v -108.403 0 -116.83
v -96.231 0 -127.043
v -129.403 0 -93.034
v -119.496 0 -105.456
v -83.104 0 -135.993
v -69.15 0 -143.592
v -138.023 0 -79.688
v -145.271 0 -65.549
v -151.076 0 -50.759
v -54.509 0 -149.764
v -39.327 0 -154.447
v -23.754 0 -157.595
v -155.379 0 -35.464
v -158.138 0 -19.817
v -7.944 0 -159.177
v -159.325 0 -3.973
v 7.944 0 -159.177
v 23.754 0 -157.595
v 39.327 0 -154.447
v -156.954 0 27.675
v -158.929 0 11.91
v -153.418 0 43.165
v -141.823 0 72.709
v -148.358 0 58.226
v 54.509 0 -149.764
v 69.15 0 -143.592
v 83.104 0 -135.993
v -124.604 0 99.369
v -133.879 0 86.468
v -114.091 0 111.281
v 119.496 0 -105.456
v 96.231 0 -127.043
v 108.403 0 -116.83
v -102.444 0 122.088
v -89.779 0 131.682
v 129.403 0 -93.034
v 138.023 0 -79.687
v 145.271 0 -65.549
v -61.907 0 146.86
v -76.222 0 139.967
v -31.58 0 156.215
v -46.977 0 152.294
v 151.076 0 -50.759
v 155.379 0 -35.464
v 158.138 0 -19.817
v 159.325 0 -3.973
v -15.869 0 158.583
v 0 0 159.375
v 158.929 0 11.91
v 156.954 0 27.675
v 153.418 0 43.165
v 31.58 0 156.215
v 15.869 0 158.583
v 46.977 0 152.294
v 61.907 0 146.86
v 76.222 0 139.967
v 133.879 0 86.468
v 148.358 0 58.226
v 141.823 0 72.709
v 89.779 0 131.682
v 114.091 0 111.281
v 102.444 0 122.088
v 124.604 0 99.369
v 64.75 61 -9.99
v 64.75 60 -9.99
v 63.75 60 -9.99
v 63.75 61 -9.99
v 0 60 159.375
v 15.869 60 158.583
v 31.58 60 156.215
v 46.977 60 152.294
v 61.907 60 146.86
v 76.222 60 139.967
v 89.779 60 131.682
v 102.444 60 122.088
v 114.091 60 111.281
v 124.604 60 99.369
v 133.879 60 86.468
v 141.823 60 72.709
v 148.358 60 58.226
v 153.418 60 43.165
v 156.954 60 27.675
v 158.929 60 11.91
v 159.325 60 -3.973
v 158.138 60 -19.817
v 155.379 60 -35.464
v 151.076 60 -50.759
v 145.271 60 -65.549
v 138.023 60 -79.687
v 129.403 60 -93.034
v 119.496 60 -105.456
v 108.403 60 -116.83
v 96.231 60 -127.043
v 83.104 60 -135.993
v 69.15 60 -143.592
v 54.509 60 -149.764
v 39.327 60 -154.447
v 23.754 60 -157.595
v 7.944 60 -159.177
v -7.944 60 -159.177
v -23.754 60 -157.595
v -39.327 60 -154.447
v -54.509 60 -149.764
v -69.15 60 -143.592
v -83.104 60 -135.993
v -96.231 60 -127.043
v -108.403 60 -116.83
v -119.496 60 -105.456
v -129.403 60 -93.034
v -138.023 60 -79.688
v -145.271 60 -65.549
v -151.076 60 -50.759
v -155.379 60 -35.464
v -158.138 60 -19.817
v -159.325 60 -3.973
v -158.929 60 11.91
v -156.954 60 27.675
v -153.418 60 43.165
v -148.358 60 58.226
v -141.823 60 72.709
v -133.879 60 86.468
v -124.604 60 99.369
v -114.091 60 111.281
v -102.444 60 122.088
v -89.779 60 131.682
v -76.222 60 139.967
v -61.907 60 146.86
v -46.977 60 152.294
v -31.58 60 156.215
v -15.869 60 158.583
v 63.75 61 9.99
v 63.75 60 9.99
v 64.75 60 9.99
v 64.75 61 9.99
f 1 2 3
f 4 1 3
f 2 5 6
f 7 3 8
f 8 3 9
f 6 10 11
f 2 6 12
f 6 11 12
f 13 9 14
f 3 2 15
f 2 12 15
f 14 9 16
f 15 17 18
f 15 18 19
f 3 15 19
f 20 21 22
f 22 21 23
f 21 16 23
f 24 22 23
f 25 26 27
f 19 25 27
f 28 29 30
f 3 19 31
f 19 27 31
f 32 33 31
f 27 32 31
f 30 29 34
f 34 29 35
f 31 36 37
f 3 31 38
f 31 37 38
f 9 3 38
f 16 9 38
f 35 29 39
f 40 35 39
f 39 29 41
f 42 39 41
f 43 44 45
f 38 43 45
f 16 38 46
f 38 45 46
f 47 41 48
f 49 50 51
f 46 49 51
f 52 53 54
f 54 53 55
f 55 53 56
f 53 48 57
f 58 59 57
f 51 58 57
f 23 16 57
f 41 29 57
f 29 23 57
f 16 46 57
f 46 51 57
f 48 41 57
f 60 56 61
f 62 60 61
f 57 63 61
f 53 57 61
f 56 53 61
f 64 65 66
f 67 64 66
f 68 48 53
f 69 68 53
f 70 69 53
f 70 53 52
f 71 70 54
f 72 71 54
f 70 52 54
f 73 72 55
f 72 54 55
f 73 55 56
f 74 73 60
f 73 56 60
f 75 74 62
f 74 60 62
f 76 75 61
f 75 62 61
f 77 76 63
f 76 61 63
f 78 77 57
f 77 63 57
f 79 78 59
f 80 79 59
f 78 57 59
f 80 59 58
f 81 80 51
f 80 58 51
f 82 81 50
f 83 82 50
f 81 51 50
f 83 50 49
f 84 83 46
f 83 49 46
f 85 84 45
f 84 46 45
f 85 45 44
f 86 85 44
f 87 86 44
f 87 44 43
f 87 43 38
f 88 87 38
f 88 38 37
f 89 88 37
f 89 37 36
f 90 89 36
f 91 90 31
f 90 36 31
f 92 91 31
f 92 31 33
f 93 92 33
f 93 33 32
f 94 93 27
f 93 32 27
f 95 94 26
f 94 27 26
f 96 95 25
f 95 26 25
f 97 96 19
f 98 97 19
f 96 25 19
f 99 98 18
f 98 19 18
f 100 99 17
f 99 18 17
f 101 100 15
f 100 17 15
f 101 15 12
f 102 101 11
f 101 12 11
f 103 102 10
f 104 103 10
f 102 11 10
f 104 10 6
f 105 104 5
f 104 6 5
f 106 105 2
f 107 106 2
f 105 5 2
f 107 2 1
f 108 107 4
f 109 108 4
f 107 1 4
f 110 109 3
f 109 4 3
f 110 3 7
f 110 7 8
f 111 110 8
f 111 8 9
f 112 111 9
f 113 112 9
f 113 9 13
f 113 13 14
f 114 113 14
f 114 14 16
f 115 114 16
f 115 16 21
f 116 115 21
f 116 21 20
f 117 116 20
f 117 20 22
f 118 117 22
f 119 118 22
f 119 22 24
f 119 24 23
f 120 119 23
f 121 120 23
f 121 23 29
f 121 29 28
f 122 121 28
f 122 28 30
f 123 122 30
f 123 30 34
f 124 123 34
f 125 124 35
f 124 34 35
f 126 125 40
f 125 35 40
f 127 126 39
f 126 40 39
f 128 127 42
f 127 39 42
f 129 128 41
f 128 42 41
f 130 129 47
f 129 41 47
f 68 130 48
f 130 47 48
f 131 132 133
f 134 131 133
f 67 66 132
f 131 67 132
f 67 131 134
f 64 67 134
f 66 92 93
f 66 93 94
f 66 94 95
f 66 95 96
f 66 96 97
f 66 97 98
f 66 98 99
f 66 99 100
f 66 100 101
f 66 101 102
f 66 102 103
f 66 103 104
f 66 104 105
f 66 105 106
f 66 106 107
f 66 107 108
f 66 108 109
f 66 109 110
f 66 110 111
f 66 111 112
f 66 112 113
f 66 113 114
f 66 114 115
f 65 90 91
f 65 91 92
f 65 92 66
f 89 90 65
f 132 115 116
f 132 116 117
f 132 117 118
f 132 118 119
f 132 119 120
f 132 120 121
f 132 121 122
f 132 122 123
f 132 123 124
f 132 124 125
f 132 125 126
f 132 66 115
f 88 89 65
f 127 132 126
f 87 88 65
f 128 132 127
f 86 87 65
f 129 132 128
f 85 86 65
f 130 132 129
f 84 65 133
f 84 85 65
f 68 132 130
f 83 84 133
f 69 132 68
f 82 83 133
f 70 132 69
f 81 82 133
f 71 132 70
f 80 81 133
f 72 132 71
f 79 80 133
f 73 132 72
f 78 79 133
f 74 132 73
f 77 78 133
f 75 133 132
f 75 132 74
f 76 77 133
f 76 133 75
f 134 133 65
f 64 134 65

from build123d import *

# Parameters (mm, degrees)
SKETCH1_R           = 159.375
BOSS_EXTRUDE2_DEPTH = 60
BOSS_EXTRUDE4_DEPTH = 1


with BuildPart() as part:
    # Sketch1 → Boss-Extrude2 (new body)
    with BuildSketch(Plane(origin=(0, 0, 0), x_dir=(1, 0, 0), z_dir=(0, 1, 0))):
        with Locations(Location((0, 0, 0), (0, 0, 270))):
            Circle(SKETCH1_R)
    extrude(amount=BOSS_EXTRUDE2_DEPTH)

    # Sketch3 → Boss-Extrude4 (add)
    with BuildSketch(Plane(origin=(0, 60, 0), x_dir=(1, 0, 0), z_dir=(0, 1, 0))):
        Polygon((63.75, 9.990395), (63.75, 0), (63.75, -9.990395), (64.75, -9.990395), (64.75, 9.990395), align=None)
    extrude(amount=BOSS_EXTRUDE4_DEPTH)


solid = part.part
